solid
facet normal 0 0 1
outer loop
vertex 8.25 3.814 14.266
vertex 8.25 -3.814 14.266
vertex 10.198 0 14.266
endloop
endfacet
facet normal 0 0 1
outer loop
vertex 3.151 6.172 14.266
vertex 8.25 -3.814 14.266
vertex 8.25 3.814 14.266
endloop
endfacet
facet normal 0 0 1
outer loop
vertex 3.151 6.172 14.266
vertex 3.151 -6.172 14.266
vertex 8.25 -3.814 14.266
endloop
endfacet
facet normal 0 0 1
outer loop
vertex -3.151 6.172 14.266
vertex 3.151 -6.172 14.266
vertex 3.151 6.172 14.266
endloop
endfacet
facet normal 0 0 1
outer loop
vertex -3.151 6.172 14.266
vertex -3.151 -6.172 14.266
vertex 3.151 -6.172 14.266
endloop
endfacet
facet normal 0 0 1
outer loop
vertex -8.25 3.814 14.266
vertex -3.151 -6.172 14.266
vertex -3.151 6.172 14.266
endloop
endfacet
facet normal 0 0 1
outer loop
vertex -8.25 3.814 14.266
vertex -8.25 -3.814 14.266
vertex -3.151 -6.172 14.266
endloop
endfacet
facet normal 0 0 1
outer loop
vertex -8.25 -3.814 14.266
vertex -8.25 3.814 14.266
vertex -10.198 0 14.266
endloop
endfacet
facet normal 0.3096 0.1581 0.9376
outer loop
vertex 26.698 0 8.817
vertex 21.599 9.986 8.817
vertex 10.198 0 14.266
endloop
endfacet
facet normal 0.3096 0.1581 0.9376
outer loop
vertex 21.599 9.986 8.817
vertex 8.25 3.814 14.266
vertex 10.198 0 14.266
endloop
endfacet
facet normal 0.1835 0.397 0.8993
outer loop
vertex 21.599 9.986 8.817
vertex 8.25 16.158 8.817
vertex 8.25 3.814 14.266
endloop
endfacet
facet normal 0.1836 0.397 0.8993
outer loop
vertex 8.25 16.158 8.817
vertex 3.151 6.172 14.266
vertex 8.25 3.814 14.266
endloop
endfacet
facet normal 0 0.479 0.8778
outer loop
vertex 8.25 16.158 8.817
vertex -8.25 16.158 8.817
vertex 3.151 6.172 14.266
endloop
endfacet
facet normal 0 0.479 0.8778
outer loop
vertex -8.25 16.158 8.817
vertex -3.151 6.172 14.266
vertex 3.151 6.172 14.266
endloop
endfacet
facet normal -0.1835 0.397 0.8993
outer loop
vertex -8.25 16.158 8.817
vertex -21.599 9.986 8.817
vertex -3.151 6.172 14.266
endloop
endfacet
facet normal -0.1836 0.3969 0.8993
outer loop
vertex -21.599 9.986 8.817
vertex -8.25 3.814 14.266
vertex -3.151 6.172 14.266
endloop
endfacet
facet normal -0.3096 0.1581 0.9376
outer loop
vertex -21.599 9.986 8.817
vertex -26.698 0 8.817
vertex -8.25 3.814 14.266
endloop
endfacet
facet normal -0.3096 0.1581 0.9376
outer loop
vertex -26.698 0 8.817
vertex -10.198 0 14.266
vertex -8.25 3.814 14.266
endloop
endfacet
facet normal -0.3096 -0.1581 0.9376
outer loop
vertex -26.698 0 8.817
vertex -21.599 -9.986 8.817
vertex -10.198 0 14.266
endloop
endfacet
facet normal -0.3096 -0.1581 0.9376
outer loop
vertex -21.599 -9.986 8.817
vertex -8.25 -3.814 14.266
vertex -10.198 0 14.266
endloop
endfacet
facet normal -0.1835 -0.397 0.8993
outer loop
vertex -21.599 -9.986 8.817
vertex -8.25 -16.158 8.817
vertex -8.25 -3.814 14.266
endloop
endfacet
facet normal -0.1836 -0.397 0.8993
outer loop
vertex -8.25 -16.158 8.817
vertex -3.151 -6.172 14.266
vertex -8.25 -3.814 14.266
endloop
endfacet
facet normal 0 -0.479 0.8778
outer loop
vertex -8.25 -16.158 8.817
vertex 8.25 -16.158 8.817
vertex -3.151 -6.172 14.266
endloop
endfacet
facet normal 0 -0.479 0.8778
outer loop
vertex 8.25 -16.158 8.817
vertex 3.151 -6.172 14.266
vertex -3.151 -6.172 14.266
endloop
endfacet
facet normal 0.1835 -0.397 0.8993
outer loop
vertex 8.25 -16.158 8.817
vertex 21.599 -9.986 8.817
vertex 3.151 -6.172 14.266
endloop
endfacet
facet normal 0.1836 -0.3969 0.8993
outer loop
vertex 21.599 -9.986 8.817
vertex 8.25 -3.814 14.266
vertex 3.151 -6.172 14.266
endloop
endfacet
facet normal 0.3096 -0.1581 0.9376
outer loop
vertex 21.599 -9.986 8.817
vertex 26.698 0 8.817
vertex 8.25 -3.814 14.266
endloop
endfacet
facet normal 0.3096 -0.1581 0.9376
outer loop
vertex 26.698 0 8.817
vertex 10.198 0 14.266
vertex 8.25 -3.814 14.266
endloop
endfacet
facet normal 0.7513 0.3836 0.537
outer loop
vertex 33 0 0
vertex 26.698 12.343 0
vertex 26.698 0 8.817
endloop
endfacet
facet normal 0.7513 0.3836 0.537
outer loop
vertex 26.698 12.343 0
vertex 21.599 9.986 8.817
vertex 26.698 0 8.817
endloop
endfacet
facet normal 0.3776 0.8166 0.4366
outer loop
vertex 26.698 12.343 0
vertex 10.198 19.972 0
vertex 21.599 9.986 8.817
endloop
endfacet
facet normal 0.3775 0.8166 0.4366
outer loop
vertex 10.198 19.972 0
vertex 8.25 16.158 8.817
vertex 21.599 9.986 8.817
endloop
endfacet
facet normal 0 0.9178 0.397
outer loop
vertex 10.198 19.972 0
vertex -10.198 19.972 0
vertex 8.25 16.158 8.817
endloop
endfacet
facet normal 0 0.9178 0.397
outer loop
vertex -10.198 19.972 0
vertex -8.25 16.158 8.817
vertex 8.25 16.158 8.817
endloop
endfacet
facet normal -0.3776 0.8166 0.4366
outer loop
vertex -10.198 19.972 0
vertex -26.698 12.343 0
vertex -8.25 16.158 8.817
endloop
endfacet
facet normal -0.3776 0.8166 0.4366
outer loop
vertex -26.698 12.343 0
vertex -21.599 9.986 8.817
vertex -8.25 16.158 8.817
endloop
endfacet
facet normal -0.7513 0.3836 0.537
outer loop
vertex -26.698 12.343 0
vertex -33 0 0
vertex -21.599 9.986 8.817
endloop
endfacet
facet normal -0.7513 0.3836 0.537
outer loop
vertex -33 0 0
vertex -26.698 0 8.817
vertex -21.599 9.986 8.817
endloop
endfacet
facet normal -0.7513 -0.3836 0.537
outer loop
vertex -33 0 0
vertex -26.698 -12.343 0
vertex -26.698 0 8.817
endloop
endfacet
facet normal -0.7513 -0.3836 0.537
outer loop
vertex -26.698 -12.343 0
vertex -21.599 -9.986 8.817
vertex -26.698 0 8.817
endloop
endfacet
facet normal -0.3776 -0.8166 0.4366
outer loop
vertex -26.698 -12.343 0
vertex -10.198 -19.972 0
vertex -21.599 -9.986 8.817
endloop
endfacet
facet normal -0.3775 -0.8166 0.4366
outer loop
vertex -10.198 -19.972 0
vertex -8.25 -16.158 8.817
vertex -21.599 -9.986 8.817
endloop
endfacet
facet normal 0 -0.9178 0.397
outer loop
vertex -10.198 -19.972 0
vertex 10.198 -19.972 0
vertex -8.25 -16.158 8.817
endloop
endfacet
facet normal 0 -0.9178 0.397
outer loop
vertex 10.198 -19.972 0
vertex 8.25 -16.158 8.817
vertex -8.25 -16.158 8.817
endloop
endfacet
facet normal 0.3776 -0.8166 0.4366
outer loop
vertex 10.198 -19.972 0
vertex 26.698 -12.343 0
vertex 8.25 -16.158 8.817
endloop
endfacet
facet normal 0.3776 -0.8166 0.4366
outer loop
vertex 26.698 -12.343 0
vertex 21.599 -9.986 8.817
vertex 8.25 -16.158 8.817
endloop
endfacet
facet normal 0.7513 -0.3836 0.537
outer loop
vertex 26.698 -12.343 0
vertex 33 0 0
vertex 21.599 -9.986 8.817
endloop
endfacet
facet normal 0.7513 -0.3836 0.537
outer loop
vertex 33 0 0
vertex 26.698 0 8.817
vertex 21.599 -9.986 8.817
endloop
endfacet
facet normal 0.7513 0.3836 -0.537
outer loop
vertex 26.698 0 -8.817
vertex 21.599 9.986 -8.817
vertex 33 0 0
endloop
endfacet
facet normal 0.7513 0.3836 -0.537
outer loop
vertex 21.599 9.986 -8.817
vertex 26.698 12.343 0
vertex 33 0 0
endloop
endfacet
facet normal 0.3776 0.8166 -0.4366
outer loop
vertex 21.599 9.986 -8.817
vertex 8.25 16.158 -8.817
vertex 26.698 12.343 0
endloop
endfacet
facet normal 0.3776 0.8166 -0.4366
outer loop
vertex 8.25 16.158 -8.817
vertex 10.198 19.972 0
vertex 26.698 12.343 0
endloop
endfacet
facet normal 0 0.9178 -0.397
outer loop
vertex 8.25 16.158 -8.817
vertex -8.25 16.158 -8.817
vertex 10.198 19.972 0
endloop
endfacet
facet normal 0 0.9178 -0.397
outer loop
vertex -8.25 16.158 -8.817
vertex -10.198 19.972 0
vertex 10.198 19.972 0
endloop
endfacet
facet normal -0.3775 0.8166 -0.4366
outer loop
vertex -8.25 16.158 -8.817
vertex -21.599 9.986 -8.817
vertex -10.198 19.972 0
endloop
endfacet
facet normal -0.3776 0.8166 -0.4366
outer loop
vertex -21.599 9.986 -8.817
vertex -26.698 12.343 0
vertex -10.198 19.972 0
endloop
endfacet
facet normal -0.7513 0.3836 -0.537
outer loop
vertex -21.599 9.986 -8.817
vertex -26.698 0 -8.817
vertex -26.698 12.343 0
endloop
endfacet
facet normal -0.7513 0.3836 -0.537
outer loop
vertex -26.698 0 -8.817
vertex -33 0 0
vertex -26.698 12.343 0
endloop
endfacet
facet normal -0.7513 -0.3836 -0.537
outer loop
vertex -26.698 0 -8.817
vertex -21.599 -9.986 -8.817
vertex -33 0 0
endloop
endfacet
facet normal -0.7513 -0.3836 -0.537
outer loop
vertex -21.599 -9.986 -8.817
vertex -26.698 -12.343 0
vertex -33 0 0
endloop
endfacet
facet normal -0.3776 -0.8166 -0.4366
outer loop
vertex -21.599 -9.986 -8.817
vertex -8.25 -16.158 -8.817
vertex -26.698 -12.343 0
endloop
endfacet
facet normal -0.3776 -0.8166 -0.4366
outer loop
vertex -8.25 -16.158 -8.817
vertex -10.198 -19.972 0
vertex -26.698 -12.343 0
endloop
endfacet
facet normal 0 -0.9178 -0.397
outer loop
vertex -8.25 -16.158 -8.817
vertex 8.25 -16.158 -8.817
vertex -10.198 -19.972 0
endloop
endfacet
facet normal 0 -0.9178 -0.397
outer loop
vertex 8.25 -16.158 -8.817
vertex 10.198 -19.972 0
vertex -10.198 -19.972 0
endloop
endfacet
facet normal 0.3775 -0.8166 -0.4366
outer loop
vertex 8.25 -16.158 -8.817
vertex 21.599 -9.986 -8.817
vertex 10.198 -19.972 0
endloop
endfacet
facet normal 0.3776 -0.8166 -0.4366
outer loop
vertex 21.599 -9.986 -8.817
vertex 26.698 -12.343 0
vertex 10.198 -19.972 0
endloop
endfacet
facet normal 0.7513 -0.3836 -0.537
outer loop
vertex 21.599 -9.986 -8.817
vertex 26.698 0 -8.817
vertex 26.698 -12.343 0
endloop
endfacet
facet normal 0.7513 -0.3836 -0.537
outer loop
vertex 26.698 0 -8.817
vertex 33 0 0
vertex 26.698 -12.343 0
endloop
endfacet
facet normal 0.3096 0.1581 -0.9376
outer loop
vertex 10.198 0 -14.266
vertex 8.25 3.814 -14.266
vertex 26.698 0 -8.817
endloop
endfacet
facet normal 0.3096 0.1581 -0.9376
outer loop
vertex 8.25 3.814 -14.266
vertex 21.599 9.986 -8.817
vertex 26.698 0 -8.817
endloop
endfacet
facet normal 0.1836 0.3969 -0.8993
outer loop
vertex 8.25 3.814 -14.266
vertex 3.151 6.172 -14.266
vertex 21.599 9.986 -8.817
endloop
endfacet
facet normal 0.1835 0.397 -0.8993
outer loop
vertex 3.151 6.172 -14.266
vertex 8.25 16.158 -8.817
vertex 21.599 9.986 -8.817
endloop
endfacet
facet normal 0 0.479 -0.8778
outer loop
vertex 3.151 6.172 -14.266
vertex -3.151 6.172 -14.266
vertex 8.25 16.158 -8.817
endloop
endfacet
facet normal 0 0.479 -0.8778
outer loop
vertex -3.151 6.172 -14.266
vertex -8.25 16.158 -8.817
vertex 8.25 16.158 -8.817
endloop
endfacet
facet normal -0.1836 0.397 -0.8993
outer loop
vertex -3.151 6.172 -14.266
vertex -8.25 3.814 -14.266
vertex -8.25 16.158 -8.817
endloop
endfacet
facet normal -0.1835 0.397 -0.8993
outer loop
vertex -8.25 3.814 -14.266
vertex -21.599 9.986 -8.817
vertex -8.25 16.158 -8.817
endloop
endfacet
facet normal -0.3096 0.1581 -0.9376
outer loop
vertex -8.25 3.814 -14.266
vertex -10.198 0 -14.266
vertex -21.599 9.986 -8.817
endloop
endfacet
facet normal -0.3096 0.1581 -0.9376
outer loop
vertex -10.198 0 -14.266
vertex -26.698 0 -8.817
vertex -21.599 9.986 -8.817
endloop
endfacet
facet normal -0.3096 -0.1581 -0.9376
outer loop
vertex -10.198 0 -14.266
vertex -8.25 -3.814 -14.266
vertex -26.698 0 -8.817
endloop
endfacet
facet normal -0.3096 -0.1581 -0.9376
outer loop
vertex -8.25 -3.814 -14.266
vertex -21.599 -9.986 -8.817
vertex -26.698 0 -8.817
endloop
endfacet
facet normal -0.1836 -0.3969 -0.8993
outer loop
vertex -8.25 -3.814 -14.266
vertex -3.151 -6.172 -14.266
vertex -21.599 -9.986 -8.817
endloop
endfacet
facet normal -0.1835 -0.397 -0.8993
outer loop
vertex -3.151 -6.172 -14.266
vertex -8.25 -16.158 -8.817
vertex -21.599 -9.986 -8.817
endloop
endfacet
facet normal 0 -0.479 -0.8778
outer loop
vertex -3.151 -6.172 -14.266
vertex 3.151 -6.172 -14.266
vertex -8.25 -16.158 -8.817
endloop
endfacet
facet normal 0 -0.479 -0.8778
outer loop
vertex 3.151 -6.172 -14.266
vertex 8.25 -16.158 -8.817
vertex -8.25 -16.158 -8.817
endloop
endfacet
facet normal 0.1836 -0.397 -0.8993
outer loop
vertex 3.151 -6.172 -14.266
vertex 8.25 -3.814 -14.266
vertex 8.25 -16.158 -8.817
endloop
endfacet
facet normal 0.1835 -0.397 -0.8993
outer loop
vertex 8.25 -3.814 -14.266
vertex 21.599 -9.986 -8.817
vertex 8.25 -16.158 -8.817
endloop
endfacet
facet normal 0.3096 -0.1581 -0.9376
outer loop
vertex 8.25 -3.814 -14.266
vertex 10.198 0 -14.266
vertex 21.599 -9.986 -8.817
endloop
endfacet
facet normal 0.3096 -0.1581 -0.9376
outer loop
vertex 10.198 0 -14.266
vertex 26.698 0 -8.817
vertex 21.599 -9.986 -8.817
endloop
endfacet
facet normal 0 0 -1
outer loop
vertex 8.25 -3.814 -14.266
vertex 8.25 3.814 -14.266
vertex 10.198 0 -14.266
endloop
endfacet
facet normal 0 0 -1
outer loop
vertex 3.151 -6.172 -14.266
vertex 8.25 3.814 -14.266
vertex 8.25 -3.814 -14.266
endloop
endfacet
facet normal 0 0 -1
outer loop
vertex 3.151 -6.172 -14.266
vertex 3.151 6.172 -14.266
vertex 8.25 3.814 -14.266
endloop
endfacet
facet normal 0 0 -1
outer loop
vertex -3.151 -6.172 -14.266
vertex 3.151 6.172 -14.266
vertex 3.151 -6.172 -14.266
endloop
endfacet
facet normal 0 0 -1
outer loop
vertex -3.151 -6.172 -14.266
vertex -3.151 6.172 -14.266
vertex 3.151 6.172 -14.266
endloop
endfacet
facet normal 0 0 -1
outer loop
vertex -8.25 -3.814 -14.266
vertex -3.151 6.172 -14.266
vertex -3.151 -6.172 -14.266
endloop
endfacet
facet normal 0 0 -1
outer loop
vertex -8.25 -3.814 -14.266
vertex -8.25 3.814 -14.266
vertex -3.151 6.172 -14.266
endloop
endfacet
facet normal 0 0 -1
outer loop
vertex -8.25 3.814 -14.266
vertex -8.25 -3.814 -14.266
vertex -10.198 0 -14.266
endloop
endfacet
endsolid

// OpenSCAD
// Generated by SolidPython 1.0.1 on 2020-07-29 00:46:49


scale(v = [11, 7, 5]) {
	sphere(r = 3);
}
/***********************************************
*********      SolidPython code:      **********
************************************************
 
# import packages: SolidPython
from solid import *
from solid.utils import *
from itertools import chain, combinations, permutations


class Resize:

    def __init__(self, scad_file):
        self.scad_file = scad_file
        #self.scad_file = import_scad(scad_file)
        # cone/cylinder param:
        self.r1 = 0
        self.r2 = 0
        self.h = 0
        # rectangular prism param:
        self.w = 0
        self.l = 0
        # ellipse param:
        self.r = 0

    # import OpenScad code (file name corresponds to shape)


    # classify shape + parameters
    def assign(self, param1, param2, param3):
        if self.scad_file == 'cone.scad':
            self.r1 = param1
            self.r2 = param2
            self.h = param3
        elif self.scad_file == 'cylinder.scad':
            self.r1 = param1
            self.r2 = param2
            self.h = param3
        elif self.scad_file == 'rectangularPrism.scad':
            self.h = param1
            self.l = param2
            self.w = param3
        else:
            self.r = param1
            self.h = param2

    # resize parameters
    def iterate(self):
        x = range(3, 20, 2)
        i = 1
        if self.scad_file == 'cone.scad':
            tempList = list(permutations(x, 2))
            for temp in tempList:
                param1 = temp[0]
                param2 = temp[1]
                filepath = 'produced_scad_files/' + 'cone' + str(param1) + '_' + str(param2) + '_' + '.scad'
                scad_render_to_file(cylinder(h=param1, r1=param2, r2=0), filepath)

        elif self.scad_file == 'cylinder.scad':
            tempList = list(permutations(x, 3))
            for temp in tempList:
                param1 = temp[0]
                param2 = temp[1]
                filepath = 'produced_scad_files/' + 'cylinder' + str(param1) + '_' + str(param2) + '_' + '.scad'
                scad_render_to_file(cylinder(h=param1, r1=param2, r2=param2), filepath)

        elif self.scad_file == 'rectangularPrism.scad':
            tempList = list(permutations(x, 3))
            for temp in tempList:
                param1 = temp[0]
                param2 = temp[1]
                param3 = temp[2]
                filepath = 'produced_scad_files/' + 'rectangularPrism' + str(param1) + '_' + str(param2) + '_' + str(
                    param3) + '.scad'
                scad_render_to_file(cube(size=(param1, param2, param3)), filepath)

        elif self.scad_file == 'ellipse.scad':
            tempList = list(permutations(x, 4))
            for temp in tempList:
                param1 = temp[0]
                param2 = temp[1]
                param3 = temp[2]
                param4 = temp[3]
                filepath = 'produced_scad_files/' + 'ellipse' + str(param1) + '_' + str(param2) + '_' + str(param3) + '_' + str(param4) + '.scad'
                scad_render_to_file(scale([param1, param2, param3])(sphere(r=param4)), filepath)

    def render_to_scadfile(self):
        scad_render_to_file(scad, 'example.scad') 
 
************************************************/
